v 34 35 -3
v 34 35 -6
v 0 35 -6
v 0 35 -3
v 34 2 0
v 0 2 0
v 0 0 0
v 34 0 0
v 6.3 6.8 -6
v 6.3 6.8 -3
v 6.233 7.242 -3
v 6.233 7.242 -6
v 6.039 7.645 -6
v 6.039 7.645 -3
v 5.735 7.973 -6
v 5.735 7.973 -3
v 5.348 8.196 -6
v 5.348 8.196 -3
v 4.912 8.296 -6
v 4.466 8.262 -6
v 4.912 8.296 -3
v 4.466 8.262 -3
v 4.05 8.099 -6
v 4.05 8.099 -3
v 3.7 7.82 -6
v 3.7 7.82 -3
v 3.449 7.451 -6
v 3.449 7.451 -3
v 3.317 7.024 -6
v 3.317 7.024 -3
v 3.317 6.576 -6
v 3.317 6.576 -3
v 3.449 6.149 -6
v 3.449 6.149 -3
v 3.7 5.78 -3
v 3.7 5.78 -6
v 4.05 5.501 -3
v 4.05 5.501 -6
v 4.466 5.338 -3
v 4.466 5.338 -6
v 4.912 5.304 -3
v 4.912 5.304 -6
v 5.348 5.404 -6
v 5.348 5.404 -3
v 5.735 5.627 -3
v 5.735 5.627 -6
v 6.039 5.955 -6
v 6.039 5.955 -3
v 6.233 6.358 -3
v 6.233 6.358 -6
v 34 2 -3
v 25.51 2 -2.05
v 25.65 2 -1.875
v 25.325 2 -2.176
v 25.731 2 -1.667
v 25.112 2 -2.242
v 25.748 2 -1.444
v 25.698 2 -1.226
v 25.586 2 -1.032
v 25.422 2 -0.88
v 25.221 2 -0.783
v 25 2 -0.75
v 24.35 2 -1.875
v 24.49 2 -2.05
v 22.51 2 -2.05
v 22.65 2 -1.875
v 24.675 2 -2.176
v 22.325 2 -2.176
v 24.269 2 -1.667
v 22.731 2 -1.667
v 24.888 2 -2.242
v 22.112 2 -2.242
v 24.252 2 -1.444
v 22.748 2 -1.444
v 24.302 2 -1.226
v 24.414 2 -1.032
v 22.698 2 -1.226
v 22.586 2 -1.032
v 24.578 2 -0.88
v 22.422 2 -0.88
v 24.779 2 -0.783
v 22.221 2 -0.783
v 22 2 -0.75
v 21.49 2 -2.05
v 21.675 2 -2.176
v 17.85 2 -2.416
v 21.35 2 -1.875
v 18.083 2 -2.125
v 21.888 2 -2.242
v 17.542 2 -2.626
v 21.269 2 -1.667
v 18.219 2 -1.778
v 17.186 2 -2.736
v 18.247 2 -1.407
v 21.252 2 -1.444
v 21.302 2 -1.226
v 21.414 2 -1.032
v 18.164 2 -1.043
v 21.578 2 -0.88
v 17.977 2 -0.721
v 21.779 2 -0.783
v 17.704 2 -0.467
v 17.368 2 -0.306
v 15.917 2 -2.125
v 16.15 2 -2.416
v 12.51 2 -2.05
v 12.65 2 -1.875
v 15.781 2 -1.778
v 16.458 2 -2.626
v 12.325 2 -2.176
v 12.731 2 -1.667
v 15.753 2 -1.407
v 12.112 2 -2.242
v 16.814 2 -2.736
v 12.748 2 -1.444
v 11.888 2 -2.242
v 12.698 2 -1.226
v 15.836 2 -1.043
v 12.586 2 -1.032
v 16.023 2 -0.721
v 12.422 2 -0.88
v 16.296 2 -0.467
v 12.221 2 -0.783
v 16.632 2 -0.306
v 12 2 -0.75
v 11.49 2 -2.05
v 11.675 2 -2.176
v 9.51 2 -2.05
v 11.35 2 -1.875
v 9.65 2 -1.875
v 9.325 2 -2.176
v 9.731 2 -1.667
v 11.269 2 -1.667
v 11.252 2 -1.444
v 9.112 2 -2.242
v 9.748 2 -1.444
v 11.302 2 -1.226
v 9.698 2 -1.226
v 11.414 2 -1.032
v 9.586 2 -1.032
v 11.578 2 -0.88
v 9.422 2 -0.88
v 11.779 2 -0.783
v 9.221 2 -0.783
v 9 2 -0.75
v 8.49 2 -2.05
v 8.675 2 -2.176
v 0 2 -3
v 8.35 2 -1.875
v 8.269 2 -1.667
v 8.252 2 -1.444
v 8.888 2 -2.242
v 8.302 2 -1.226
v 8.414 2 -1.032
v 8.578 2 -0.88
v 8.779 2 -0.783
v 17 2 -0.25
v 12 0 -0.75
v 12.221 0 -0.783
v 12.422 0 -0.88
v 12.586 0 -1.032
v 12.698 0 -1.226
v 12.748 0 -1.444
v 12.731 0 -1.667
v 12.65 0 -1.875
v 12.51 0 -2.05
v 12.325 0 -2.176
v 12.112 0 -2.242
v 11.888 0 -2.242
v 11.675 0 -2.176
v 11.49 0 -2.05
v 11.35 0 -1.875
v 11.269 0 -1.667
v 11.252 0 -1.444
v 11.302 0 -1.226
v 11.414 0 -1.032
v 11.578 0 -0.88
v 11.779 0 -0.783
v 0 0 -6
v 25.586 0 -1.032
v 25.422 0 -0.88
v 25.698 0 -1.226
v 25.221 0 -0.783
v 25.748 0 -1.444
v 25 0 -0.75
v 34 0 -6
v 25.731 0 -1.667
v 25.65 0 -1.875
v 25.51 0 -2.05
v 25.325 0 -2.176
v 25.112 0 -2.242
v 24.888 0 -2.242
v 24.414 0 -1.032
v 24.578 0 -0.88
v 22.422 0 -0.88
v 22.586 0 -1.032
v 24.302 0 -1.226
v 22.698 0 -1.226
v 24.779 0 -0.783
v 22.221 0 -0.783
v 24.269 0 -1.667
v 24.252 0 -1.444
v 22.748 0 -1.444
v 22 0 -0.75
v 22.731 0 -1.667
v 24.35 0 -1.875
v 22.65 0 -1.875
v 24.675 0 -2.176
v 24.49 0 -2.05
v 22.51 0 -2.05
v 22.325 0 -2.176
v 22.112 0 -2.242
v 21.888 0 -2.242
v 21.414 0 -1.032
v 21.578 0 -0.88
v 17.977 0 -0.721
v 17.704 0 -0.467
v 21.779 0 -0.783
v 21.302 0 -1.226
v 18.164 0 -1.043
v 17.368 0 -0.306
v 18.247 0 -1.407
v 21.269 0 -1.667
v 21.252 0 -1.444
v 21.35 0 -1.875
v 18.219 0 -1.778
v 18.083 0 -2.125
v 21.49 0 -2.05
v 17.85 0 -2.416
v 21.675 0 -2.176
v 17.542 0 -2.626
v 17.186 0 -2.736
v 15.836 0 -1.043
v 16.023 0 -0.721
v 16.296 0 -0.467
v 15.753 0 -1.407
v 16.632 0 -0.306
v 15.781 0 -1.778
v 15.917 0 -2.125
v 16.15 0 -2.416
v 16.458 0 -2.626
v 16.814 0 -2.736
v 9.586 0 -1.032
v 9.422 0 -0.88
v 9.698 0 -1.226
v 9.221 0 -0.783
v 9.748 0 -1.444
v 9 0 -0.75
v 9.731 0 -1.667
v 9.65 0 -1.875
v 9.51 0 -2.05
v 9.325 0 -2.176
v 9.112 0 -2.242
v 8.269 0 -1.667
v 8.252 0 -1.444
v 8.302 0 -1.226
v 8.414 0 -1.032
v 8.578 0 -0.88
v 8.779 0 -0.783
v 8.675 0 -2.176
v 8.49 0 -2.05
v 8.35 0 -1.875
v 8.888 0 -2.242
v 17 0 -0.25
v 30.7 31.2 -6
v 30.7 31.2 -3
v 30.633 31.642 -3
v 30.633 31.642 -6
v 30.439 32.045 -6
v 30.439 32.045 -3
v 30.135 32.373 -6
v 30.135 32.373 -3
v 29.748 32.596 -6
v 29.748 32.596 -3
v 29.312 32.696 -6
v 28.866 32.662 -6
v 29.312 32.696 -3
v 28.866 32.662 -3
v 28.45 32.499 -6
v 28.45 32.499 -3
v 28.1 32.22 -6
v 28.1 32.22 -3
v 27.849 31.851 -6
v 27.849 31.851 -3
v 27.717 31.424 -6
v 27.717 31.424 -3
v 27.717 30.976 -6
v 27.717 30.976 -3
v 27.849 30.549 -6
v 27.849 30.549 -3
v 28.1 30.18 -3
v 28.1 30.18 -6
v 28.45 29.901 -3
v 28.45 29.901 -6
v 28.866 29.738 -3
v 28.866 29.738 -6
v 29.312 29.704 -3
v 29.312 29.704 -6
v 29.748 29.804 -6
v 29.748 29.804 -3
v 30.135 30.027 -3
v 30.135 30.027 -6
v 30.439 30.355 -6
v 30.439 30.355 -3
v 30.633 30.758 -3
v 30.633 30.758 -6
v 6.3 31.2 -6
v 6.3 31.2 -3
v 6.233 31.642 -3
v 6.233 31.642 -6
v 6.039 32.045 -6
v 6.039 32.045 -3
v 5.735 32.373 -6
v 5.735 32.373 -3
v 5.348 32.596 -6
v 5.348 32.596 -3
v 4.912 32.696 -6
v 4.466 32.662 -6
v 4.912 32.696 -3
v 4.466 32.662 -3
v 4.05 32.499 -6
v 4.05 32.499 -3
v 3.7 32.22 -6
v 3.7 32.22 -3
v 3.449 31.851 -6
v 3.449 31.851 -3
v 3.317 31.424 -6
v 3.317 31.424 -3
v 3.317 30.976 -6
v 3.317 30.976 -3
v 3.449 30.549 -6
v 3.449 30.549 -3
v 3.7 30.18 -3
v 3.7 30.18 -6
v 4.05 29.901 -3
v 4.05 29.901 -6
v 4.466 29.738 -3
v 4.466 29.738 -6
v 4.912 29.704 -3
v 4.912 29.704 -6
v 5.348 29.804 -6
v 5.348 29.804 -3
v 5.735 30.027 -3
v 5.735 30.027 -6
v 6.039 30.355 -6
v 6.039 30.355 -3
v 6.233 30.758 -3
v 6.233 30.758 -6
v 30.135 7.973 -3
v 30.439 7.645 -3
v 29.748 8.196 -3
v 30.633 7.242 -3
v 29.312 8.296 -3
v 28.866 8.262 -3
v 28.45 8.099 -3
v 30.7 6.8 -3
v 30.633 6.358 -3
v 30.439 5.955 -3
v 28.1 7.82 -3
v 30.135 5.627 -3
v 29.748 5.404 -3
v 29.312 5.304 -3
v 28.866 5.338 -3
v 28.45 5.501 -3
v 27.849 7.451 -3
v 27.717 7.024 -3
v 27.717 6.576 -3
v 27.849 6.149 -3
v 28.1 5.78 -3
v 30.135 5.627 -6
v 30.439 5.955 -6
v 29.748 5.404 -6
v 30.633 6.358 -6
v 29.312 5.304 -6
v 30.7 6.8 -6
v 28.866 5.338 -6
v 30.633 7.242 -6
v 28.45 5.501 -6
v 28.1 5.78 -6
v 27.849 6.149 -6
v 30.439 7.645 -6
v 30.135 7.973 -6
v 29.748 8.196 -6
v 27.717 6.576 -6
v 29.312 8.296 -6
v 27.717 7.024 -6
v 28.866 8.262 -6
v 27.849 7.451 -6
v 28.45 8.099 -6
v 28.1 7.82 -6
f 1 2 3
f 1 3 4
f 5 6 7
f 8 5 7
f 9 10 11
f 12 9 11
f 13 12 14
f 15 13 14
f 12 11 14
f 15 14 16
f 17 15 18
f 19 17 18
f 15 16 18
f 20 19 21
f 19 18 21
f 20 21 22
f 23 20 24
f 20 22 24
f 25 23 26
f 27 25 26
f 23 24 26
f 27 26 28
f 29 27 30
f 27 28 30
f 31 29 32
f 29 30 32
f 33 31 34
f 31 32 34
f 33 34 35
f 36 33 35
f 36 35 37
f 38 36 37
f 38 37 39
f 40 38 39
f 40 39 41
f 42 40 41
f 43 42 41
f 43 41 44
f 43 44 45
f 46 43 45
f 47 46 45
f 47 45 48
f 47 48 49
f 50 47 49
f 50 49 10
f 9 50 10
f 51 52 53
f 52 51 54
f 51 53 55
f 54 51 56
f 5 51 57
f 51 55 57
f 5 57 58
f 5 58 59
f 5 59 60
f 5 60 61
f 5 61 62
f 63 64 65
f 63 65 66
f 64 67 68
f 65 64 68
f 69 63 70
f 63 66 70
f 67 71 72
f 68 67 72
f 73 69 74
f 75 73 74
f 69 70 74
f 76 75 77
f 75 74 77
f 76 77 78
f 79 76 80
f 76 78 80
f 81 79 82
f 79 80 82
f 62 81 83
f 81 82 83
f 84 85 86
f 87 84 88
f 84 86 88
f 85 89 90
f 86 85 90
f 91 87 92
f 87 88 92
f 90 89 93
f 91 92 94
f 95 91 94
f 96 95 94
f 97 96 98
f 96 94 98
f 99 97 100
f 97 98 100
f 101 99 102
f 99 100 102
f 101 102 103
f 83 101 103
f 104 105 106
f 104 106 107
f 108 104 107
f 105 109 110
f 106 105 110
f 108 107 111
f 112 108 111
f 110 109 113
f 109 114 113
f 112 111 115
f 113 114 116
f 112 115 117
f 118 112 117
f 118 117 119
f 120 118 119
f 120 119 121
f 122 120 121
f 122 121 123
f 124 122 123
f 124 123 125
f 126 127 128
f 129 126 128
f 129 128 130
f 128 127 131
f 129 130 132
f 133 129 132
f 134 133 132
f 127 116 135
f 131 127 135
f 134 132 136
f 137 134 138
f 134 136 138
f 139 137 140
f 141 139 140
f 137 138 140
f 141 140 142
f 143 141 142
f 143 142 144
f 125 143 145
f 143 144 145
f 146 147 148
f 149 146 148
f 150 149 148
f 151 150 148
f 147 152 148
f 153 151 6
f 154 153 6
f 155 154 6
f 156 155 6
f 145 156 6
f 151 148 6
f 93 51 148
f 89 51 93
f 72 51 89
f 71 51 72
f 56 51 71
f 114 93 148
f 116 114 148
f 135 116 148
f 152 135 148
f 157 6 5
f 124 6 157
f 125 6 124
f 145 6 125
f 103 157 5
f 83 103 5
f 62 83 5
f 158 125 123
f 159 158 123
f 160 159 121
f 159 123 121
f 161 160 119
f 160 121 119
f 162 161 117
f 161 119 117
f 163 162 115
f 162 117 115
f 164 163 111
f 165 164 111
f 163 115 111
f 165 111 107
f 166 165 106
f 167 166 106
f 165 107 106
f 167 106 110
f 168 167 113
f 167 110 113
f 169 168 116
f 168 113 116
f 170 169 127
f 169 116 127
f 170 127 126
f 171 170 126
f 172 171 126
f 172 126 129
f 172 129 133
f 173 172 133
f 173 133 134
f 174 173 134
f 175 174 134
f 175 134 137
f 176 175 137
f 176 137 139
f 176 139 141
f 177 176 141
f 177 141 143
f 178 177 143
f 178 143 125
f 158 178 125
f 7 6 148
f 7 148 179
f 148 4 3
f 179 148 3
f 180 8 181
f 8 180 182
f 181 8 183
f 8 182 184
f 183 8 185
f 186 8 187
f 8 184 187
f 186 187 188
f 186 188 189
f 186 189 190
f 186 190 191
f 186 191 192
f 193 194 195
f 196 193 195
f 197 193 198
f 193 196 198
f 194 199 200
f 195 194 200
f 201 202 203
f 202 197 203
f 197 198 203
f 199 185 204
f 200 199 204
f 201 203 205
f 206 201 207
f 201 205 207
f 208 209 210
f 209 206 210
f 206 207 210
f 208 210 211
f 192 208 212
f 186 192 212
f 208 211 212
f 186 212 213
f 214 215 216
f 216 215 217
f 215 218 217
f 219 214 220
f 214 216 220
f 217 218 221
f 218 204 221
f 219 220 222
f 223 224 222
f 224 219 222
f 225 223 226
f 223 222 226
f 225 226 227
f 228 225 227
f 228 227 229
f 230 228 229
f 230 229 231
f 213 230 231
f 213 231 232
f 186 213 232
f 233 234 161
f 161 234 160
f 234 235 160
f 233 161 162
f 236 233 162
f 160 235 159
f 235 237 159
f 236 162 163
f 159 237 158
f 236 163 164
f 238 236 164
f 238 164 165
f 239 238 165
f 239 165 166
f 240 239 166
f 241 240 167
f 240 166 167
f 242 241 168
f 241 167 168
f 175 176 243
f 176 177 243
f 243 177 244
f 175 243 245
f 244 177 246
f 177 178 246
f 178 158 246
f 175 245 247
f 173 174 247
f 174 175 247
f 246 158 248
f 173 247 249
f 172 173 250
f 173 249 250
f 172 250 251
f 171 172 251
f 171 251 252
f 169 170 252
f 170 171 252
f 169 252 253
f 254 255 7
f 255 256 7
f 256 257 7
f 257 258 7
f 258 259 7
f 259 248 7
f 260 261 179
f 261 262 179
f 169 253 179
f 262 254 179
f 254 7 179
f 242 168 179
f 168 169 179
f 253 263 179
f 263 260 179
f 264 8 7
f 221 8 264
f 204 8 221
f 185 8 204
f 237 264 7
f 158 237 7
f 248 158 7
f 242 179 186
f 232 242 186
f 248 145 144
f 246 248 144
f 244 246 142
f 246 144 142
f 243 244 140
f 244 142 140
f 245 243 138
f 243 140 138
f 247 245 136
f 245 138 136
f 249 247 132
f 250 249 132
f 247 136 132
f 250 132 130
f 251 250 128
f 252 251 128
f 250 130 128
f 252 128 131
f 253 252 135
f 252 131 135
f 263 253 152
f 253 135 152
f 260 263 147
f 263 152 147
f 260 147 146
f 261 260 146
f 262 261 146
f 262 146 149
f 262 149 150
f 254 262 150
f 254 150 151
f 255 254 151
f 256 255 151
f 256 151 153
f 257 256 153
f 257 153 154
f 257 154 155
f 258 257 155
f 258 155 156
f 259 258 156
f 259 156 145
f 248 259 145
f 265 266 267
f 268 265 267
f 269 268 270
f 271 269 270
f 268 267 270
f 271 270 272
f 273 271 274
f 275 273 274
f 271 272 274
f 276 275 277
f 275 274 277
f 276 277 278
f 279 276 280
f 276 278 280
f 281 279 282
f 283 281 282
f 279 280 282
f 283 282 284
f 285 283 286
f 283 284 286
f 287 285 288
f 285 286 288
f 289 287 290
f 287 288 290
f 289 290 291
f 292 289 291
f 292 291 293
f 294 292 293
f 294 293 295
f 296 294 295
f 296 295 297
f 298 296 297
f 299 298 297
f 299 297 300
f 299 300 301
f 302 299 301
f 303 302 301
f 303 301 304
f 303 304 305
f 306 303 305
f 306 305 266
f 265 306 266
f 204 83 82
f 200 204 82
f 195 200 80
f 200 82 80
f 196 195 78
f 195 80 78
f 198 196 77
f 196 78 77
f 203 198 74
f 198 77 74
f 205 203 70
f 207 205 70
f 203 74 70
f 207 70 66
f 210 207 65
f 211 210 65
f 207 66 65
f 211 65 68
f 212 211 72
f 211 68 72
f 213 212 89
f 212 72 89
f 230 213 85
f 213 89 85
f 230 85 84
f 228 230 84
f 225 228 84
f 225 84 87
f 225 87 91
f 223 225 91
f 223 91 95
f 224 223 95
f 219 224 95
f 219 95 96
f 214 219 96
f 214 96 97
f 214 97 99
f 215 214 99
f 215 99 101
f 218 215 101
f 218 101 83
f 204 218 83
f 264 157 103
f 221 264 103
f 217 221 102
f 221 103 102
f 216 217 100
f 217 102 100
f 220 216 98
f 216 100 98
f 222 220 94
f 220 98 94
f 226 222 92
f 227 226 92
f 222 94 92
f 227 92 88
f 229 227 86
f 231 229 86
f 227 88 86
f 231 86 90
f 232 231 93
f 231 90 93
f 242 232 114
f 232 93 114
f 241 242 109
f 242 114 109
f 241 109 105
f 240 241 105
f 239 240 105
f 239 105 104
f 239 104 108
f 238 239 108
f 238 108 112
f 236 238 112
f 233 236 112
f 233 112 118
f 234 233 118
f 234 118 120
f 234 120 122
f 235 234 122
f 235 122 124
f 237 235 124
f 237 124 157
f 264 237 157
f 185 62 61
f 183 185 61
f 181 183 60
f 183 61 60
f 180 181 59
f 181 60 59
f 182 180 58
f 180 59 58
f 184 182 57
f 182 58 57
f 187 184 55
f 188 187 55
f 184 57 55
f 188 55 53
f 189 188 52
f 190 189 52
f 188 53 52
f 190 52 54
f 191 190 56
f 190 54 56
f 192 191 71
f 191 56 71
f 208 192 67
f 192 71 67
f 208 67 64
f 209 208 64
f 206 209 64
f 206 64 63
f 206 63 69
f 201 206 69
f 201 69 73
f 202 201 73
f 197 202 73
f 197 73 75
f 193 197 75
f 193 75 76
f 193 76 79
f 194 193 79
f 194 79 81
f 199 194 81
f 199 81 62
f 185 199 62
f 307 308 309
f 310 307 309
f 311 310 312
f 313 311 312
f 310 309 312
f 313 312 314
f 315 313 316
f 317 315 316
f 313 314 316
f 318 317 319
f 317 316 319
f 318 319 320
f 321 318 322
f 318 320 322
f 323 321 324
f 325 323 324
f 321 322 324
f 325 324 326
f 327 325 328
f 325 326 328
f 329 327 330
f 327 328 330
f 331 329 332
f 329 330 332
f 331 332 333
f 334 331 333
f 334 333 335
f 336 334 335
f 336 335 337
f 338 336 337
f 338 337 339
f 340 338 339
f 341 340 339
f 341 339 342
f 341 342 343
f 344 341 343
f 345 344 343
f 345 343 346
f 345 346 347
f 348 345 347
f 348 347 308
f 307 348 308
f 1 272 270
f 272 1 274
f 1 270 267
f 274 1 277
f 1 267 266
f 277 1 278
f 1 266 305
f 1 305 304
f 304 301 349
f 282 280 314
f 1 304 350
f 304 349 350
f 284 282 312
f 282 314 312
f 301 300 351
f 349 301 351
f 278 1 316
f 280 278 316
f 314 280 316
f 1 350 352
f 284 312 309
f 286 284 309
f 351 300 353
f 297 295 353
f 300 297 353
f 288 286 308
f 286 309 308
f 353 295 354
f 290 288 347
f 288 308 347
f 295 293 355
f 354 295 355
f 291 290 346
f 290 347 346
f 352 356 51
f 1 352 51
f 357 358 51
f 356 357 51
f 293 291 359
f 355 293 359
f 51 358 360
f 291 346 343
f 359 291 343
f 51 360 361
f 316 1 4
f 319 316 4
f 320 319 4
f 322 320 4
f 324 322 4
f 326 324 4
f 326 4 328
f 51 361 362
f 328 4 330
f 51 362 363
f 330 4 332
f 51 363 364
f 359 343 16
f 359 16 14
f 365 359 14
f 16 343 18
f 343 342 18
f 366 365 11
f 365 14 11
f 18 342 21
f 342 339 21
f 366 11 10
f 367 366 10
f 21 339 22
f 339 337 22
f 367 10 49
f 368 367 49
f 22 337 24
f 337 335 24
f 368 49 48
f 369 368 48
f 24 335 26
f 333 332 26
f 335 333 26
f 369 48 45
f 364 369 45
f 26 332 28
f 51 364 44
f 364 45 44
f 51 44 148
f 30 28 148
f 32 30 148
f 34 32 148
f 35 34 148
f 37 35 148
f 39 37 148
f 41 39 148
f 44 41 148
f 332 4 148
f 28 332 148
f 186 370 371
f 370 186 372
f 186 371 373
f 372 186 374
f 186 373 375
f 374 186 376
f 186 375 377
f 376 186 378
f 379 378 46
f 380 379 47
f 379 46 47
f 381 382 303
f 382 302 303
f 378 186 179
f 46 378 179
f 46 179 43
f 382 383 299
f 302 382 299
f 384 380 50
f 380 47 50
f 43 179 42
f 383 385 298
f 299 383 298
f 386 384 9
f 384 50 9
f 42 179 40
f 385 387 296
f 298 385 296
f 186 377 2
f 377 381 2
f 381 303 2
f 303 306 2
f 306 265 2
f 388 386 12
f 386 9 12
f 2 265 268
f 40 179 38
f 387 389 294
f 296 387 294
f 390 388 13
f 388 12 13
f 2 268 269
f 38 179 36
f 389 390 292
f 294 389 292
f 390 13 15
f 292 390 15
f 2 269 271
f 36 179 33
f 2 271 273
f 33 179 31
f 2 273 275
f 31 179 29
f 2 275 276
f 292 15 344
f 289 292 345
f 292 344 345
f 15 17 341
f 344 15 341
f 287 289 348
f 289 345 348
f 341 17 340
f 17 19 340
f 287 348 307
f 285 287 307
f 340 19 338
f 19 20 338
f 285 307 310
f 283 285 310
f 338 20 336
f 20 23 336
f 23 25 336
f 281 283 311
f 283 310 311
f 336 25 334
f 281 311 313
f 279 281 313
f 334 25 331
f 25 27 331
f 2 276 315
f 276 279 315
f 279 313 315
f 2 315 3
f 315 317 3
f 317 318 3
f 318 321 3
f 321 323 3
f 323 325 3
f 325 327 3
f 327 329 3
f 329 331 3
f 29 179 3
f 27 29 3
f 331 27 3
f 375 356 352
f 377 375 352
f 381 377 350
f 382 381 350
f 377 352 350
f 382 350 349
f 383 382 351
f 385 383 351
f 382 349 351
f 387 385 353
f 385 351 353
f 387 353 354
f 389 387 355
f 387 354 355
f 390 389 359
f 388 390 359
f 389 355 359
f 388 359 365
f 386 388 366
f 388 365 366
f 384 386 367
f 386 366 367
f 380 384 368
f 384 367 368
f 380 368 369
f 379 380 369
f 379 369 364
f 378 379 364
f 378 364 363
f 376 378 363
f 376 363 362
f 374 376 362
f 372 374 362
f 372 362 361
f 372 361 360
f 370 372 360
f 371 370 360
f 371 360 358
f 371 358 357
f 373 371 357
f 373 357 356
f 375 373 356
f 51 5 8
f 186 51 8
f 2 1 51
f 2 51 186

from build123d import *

# Parameters (mm, degrees)
BOSS_EXTRUDE1_DEPTH = 34
SKETCH2_R           = 1.5
CUT_EXTRUDE1_DEPTH  = 49.887626246
SKETCH3_R           = 1.25
SKETCH3_R_2         = 0.75
CUT_EXTRUDE2_DEPTH  = 48.759815745


with BuildPart() as part:
    # Sketch1 → Boss-Extrude1 (new body)
    with BuildSketch(Plane(origin=(0, 0, 0), x_dir=(0, 0, -1), z_dir=(1, 0, 0))):
        Polygon((0, 0), (6, 0), (6, 35), (3, 35), (3, 2), (0, 2), align=None)
    extrude(amount=BOSS_EXTRUDE1_DEPTH)

    # Sketch2 → Cut-Extrude1 (cut, through all)
    with BuildSketch(Plane.XY.offset(-3)):
        with Locations((29.2, 31.2)):
            Circle(SKETCH2_R)
        with Locations((4.8, 31.2)):
            Circle(SKETCH2_R)
        with Locations((4.8, 6.8)):
            Circle(SKETCH2_R)
        with Locations((29.2, 6.8)):
            Circle(SKETCH2_R)
    extrude(amount=-CUT_EXTRUDE1_DEPTH, mode=Mode.SUBTRACT)

    # Sketch3 → Cut-Extrude2 (cut, through all)
    with BuildSketch(Plane(origin=(0, 2, 0), x_dir=(1, 0, 0), z_dir=(0, 1, 0))):
        with Locations(Location((17, 1.5, 0), (0, 0, 270))):
            Circle(SKETCH3_R)
        with Locations(Location((22, 1.5, 0), (0, 0, 270))):
            Circle(SKETCH3_R_2)
        with Locations(Location((25, 1.5, 0), (0, 0, 270))):
            Circle(SKETCH3_R_2)
        with Locations(Location((12, 1.5, 0), (0, 0, 270))):
            Circle(SKETCH3_R_2)
        with Locations(Location((9, 1.5, 0), (0, 0, 270))):
            Circle(SKETCH3_R_2)
    extrude(amount=-CUT_EXTRUDE2_DEPTH, mode=Mode.SUBTRACT)


solid = part.part
